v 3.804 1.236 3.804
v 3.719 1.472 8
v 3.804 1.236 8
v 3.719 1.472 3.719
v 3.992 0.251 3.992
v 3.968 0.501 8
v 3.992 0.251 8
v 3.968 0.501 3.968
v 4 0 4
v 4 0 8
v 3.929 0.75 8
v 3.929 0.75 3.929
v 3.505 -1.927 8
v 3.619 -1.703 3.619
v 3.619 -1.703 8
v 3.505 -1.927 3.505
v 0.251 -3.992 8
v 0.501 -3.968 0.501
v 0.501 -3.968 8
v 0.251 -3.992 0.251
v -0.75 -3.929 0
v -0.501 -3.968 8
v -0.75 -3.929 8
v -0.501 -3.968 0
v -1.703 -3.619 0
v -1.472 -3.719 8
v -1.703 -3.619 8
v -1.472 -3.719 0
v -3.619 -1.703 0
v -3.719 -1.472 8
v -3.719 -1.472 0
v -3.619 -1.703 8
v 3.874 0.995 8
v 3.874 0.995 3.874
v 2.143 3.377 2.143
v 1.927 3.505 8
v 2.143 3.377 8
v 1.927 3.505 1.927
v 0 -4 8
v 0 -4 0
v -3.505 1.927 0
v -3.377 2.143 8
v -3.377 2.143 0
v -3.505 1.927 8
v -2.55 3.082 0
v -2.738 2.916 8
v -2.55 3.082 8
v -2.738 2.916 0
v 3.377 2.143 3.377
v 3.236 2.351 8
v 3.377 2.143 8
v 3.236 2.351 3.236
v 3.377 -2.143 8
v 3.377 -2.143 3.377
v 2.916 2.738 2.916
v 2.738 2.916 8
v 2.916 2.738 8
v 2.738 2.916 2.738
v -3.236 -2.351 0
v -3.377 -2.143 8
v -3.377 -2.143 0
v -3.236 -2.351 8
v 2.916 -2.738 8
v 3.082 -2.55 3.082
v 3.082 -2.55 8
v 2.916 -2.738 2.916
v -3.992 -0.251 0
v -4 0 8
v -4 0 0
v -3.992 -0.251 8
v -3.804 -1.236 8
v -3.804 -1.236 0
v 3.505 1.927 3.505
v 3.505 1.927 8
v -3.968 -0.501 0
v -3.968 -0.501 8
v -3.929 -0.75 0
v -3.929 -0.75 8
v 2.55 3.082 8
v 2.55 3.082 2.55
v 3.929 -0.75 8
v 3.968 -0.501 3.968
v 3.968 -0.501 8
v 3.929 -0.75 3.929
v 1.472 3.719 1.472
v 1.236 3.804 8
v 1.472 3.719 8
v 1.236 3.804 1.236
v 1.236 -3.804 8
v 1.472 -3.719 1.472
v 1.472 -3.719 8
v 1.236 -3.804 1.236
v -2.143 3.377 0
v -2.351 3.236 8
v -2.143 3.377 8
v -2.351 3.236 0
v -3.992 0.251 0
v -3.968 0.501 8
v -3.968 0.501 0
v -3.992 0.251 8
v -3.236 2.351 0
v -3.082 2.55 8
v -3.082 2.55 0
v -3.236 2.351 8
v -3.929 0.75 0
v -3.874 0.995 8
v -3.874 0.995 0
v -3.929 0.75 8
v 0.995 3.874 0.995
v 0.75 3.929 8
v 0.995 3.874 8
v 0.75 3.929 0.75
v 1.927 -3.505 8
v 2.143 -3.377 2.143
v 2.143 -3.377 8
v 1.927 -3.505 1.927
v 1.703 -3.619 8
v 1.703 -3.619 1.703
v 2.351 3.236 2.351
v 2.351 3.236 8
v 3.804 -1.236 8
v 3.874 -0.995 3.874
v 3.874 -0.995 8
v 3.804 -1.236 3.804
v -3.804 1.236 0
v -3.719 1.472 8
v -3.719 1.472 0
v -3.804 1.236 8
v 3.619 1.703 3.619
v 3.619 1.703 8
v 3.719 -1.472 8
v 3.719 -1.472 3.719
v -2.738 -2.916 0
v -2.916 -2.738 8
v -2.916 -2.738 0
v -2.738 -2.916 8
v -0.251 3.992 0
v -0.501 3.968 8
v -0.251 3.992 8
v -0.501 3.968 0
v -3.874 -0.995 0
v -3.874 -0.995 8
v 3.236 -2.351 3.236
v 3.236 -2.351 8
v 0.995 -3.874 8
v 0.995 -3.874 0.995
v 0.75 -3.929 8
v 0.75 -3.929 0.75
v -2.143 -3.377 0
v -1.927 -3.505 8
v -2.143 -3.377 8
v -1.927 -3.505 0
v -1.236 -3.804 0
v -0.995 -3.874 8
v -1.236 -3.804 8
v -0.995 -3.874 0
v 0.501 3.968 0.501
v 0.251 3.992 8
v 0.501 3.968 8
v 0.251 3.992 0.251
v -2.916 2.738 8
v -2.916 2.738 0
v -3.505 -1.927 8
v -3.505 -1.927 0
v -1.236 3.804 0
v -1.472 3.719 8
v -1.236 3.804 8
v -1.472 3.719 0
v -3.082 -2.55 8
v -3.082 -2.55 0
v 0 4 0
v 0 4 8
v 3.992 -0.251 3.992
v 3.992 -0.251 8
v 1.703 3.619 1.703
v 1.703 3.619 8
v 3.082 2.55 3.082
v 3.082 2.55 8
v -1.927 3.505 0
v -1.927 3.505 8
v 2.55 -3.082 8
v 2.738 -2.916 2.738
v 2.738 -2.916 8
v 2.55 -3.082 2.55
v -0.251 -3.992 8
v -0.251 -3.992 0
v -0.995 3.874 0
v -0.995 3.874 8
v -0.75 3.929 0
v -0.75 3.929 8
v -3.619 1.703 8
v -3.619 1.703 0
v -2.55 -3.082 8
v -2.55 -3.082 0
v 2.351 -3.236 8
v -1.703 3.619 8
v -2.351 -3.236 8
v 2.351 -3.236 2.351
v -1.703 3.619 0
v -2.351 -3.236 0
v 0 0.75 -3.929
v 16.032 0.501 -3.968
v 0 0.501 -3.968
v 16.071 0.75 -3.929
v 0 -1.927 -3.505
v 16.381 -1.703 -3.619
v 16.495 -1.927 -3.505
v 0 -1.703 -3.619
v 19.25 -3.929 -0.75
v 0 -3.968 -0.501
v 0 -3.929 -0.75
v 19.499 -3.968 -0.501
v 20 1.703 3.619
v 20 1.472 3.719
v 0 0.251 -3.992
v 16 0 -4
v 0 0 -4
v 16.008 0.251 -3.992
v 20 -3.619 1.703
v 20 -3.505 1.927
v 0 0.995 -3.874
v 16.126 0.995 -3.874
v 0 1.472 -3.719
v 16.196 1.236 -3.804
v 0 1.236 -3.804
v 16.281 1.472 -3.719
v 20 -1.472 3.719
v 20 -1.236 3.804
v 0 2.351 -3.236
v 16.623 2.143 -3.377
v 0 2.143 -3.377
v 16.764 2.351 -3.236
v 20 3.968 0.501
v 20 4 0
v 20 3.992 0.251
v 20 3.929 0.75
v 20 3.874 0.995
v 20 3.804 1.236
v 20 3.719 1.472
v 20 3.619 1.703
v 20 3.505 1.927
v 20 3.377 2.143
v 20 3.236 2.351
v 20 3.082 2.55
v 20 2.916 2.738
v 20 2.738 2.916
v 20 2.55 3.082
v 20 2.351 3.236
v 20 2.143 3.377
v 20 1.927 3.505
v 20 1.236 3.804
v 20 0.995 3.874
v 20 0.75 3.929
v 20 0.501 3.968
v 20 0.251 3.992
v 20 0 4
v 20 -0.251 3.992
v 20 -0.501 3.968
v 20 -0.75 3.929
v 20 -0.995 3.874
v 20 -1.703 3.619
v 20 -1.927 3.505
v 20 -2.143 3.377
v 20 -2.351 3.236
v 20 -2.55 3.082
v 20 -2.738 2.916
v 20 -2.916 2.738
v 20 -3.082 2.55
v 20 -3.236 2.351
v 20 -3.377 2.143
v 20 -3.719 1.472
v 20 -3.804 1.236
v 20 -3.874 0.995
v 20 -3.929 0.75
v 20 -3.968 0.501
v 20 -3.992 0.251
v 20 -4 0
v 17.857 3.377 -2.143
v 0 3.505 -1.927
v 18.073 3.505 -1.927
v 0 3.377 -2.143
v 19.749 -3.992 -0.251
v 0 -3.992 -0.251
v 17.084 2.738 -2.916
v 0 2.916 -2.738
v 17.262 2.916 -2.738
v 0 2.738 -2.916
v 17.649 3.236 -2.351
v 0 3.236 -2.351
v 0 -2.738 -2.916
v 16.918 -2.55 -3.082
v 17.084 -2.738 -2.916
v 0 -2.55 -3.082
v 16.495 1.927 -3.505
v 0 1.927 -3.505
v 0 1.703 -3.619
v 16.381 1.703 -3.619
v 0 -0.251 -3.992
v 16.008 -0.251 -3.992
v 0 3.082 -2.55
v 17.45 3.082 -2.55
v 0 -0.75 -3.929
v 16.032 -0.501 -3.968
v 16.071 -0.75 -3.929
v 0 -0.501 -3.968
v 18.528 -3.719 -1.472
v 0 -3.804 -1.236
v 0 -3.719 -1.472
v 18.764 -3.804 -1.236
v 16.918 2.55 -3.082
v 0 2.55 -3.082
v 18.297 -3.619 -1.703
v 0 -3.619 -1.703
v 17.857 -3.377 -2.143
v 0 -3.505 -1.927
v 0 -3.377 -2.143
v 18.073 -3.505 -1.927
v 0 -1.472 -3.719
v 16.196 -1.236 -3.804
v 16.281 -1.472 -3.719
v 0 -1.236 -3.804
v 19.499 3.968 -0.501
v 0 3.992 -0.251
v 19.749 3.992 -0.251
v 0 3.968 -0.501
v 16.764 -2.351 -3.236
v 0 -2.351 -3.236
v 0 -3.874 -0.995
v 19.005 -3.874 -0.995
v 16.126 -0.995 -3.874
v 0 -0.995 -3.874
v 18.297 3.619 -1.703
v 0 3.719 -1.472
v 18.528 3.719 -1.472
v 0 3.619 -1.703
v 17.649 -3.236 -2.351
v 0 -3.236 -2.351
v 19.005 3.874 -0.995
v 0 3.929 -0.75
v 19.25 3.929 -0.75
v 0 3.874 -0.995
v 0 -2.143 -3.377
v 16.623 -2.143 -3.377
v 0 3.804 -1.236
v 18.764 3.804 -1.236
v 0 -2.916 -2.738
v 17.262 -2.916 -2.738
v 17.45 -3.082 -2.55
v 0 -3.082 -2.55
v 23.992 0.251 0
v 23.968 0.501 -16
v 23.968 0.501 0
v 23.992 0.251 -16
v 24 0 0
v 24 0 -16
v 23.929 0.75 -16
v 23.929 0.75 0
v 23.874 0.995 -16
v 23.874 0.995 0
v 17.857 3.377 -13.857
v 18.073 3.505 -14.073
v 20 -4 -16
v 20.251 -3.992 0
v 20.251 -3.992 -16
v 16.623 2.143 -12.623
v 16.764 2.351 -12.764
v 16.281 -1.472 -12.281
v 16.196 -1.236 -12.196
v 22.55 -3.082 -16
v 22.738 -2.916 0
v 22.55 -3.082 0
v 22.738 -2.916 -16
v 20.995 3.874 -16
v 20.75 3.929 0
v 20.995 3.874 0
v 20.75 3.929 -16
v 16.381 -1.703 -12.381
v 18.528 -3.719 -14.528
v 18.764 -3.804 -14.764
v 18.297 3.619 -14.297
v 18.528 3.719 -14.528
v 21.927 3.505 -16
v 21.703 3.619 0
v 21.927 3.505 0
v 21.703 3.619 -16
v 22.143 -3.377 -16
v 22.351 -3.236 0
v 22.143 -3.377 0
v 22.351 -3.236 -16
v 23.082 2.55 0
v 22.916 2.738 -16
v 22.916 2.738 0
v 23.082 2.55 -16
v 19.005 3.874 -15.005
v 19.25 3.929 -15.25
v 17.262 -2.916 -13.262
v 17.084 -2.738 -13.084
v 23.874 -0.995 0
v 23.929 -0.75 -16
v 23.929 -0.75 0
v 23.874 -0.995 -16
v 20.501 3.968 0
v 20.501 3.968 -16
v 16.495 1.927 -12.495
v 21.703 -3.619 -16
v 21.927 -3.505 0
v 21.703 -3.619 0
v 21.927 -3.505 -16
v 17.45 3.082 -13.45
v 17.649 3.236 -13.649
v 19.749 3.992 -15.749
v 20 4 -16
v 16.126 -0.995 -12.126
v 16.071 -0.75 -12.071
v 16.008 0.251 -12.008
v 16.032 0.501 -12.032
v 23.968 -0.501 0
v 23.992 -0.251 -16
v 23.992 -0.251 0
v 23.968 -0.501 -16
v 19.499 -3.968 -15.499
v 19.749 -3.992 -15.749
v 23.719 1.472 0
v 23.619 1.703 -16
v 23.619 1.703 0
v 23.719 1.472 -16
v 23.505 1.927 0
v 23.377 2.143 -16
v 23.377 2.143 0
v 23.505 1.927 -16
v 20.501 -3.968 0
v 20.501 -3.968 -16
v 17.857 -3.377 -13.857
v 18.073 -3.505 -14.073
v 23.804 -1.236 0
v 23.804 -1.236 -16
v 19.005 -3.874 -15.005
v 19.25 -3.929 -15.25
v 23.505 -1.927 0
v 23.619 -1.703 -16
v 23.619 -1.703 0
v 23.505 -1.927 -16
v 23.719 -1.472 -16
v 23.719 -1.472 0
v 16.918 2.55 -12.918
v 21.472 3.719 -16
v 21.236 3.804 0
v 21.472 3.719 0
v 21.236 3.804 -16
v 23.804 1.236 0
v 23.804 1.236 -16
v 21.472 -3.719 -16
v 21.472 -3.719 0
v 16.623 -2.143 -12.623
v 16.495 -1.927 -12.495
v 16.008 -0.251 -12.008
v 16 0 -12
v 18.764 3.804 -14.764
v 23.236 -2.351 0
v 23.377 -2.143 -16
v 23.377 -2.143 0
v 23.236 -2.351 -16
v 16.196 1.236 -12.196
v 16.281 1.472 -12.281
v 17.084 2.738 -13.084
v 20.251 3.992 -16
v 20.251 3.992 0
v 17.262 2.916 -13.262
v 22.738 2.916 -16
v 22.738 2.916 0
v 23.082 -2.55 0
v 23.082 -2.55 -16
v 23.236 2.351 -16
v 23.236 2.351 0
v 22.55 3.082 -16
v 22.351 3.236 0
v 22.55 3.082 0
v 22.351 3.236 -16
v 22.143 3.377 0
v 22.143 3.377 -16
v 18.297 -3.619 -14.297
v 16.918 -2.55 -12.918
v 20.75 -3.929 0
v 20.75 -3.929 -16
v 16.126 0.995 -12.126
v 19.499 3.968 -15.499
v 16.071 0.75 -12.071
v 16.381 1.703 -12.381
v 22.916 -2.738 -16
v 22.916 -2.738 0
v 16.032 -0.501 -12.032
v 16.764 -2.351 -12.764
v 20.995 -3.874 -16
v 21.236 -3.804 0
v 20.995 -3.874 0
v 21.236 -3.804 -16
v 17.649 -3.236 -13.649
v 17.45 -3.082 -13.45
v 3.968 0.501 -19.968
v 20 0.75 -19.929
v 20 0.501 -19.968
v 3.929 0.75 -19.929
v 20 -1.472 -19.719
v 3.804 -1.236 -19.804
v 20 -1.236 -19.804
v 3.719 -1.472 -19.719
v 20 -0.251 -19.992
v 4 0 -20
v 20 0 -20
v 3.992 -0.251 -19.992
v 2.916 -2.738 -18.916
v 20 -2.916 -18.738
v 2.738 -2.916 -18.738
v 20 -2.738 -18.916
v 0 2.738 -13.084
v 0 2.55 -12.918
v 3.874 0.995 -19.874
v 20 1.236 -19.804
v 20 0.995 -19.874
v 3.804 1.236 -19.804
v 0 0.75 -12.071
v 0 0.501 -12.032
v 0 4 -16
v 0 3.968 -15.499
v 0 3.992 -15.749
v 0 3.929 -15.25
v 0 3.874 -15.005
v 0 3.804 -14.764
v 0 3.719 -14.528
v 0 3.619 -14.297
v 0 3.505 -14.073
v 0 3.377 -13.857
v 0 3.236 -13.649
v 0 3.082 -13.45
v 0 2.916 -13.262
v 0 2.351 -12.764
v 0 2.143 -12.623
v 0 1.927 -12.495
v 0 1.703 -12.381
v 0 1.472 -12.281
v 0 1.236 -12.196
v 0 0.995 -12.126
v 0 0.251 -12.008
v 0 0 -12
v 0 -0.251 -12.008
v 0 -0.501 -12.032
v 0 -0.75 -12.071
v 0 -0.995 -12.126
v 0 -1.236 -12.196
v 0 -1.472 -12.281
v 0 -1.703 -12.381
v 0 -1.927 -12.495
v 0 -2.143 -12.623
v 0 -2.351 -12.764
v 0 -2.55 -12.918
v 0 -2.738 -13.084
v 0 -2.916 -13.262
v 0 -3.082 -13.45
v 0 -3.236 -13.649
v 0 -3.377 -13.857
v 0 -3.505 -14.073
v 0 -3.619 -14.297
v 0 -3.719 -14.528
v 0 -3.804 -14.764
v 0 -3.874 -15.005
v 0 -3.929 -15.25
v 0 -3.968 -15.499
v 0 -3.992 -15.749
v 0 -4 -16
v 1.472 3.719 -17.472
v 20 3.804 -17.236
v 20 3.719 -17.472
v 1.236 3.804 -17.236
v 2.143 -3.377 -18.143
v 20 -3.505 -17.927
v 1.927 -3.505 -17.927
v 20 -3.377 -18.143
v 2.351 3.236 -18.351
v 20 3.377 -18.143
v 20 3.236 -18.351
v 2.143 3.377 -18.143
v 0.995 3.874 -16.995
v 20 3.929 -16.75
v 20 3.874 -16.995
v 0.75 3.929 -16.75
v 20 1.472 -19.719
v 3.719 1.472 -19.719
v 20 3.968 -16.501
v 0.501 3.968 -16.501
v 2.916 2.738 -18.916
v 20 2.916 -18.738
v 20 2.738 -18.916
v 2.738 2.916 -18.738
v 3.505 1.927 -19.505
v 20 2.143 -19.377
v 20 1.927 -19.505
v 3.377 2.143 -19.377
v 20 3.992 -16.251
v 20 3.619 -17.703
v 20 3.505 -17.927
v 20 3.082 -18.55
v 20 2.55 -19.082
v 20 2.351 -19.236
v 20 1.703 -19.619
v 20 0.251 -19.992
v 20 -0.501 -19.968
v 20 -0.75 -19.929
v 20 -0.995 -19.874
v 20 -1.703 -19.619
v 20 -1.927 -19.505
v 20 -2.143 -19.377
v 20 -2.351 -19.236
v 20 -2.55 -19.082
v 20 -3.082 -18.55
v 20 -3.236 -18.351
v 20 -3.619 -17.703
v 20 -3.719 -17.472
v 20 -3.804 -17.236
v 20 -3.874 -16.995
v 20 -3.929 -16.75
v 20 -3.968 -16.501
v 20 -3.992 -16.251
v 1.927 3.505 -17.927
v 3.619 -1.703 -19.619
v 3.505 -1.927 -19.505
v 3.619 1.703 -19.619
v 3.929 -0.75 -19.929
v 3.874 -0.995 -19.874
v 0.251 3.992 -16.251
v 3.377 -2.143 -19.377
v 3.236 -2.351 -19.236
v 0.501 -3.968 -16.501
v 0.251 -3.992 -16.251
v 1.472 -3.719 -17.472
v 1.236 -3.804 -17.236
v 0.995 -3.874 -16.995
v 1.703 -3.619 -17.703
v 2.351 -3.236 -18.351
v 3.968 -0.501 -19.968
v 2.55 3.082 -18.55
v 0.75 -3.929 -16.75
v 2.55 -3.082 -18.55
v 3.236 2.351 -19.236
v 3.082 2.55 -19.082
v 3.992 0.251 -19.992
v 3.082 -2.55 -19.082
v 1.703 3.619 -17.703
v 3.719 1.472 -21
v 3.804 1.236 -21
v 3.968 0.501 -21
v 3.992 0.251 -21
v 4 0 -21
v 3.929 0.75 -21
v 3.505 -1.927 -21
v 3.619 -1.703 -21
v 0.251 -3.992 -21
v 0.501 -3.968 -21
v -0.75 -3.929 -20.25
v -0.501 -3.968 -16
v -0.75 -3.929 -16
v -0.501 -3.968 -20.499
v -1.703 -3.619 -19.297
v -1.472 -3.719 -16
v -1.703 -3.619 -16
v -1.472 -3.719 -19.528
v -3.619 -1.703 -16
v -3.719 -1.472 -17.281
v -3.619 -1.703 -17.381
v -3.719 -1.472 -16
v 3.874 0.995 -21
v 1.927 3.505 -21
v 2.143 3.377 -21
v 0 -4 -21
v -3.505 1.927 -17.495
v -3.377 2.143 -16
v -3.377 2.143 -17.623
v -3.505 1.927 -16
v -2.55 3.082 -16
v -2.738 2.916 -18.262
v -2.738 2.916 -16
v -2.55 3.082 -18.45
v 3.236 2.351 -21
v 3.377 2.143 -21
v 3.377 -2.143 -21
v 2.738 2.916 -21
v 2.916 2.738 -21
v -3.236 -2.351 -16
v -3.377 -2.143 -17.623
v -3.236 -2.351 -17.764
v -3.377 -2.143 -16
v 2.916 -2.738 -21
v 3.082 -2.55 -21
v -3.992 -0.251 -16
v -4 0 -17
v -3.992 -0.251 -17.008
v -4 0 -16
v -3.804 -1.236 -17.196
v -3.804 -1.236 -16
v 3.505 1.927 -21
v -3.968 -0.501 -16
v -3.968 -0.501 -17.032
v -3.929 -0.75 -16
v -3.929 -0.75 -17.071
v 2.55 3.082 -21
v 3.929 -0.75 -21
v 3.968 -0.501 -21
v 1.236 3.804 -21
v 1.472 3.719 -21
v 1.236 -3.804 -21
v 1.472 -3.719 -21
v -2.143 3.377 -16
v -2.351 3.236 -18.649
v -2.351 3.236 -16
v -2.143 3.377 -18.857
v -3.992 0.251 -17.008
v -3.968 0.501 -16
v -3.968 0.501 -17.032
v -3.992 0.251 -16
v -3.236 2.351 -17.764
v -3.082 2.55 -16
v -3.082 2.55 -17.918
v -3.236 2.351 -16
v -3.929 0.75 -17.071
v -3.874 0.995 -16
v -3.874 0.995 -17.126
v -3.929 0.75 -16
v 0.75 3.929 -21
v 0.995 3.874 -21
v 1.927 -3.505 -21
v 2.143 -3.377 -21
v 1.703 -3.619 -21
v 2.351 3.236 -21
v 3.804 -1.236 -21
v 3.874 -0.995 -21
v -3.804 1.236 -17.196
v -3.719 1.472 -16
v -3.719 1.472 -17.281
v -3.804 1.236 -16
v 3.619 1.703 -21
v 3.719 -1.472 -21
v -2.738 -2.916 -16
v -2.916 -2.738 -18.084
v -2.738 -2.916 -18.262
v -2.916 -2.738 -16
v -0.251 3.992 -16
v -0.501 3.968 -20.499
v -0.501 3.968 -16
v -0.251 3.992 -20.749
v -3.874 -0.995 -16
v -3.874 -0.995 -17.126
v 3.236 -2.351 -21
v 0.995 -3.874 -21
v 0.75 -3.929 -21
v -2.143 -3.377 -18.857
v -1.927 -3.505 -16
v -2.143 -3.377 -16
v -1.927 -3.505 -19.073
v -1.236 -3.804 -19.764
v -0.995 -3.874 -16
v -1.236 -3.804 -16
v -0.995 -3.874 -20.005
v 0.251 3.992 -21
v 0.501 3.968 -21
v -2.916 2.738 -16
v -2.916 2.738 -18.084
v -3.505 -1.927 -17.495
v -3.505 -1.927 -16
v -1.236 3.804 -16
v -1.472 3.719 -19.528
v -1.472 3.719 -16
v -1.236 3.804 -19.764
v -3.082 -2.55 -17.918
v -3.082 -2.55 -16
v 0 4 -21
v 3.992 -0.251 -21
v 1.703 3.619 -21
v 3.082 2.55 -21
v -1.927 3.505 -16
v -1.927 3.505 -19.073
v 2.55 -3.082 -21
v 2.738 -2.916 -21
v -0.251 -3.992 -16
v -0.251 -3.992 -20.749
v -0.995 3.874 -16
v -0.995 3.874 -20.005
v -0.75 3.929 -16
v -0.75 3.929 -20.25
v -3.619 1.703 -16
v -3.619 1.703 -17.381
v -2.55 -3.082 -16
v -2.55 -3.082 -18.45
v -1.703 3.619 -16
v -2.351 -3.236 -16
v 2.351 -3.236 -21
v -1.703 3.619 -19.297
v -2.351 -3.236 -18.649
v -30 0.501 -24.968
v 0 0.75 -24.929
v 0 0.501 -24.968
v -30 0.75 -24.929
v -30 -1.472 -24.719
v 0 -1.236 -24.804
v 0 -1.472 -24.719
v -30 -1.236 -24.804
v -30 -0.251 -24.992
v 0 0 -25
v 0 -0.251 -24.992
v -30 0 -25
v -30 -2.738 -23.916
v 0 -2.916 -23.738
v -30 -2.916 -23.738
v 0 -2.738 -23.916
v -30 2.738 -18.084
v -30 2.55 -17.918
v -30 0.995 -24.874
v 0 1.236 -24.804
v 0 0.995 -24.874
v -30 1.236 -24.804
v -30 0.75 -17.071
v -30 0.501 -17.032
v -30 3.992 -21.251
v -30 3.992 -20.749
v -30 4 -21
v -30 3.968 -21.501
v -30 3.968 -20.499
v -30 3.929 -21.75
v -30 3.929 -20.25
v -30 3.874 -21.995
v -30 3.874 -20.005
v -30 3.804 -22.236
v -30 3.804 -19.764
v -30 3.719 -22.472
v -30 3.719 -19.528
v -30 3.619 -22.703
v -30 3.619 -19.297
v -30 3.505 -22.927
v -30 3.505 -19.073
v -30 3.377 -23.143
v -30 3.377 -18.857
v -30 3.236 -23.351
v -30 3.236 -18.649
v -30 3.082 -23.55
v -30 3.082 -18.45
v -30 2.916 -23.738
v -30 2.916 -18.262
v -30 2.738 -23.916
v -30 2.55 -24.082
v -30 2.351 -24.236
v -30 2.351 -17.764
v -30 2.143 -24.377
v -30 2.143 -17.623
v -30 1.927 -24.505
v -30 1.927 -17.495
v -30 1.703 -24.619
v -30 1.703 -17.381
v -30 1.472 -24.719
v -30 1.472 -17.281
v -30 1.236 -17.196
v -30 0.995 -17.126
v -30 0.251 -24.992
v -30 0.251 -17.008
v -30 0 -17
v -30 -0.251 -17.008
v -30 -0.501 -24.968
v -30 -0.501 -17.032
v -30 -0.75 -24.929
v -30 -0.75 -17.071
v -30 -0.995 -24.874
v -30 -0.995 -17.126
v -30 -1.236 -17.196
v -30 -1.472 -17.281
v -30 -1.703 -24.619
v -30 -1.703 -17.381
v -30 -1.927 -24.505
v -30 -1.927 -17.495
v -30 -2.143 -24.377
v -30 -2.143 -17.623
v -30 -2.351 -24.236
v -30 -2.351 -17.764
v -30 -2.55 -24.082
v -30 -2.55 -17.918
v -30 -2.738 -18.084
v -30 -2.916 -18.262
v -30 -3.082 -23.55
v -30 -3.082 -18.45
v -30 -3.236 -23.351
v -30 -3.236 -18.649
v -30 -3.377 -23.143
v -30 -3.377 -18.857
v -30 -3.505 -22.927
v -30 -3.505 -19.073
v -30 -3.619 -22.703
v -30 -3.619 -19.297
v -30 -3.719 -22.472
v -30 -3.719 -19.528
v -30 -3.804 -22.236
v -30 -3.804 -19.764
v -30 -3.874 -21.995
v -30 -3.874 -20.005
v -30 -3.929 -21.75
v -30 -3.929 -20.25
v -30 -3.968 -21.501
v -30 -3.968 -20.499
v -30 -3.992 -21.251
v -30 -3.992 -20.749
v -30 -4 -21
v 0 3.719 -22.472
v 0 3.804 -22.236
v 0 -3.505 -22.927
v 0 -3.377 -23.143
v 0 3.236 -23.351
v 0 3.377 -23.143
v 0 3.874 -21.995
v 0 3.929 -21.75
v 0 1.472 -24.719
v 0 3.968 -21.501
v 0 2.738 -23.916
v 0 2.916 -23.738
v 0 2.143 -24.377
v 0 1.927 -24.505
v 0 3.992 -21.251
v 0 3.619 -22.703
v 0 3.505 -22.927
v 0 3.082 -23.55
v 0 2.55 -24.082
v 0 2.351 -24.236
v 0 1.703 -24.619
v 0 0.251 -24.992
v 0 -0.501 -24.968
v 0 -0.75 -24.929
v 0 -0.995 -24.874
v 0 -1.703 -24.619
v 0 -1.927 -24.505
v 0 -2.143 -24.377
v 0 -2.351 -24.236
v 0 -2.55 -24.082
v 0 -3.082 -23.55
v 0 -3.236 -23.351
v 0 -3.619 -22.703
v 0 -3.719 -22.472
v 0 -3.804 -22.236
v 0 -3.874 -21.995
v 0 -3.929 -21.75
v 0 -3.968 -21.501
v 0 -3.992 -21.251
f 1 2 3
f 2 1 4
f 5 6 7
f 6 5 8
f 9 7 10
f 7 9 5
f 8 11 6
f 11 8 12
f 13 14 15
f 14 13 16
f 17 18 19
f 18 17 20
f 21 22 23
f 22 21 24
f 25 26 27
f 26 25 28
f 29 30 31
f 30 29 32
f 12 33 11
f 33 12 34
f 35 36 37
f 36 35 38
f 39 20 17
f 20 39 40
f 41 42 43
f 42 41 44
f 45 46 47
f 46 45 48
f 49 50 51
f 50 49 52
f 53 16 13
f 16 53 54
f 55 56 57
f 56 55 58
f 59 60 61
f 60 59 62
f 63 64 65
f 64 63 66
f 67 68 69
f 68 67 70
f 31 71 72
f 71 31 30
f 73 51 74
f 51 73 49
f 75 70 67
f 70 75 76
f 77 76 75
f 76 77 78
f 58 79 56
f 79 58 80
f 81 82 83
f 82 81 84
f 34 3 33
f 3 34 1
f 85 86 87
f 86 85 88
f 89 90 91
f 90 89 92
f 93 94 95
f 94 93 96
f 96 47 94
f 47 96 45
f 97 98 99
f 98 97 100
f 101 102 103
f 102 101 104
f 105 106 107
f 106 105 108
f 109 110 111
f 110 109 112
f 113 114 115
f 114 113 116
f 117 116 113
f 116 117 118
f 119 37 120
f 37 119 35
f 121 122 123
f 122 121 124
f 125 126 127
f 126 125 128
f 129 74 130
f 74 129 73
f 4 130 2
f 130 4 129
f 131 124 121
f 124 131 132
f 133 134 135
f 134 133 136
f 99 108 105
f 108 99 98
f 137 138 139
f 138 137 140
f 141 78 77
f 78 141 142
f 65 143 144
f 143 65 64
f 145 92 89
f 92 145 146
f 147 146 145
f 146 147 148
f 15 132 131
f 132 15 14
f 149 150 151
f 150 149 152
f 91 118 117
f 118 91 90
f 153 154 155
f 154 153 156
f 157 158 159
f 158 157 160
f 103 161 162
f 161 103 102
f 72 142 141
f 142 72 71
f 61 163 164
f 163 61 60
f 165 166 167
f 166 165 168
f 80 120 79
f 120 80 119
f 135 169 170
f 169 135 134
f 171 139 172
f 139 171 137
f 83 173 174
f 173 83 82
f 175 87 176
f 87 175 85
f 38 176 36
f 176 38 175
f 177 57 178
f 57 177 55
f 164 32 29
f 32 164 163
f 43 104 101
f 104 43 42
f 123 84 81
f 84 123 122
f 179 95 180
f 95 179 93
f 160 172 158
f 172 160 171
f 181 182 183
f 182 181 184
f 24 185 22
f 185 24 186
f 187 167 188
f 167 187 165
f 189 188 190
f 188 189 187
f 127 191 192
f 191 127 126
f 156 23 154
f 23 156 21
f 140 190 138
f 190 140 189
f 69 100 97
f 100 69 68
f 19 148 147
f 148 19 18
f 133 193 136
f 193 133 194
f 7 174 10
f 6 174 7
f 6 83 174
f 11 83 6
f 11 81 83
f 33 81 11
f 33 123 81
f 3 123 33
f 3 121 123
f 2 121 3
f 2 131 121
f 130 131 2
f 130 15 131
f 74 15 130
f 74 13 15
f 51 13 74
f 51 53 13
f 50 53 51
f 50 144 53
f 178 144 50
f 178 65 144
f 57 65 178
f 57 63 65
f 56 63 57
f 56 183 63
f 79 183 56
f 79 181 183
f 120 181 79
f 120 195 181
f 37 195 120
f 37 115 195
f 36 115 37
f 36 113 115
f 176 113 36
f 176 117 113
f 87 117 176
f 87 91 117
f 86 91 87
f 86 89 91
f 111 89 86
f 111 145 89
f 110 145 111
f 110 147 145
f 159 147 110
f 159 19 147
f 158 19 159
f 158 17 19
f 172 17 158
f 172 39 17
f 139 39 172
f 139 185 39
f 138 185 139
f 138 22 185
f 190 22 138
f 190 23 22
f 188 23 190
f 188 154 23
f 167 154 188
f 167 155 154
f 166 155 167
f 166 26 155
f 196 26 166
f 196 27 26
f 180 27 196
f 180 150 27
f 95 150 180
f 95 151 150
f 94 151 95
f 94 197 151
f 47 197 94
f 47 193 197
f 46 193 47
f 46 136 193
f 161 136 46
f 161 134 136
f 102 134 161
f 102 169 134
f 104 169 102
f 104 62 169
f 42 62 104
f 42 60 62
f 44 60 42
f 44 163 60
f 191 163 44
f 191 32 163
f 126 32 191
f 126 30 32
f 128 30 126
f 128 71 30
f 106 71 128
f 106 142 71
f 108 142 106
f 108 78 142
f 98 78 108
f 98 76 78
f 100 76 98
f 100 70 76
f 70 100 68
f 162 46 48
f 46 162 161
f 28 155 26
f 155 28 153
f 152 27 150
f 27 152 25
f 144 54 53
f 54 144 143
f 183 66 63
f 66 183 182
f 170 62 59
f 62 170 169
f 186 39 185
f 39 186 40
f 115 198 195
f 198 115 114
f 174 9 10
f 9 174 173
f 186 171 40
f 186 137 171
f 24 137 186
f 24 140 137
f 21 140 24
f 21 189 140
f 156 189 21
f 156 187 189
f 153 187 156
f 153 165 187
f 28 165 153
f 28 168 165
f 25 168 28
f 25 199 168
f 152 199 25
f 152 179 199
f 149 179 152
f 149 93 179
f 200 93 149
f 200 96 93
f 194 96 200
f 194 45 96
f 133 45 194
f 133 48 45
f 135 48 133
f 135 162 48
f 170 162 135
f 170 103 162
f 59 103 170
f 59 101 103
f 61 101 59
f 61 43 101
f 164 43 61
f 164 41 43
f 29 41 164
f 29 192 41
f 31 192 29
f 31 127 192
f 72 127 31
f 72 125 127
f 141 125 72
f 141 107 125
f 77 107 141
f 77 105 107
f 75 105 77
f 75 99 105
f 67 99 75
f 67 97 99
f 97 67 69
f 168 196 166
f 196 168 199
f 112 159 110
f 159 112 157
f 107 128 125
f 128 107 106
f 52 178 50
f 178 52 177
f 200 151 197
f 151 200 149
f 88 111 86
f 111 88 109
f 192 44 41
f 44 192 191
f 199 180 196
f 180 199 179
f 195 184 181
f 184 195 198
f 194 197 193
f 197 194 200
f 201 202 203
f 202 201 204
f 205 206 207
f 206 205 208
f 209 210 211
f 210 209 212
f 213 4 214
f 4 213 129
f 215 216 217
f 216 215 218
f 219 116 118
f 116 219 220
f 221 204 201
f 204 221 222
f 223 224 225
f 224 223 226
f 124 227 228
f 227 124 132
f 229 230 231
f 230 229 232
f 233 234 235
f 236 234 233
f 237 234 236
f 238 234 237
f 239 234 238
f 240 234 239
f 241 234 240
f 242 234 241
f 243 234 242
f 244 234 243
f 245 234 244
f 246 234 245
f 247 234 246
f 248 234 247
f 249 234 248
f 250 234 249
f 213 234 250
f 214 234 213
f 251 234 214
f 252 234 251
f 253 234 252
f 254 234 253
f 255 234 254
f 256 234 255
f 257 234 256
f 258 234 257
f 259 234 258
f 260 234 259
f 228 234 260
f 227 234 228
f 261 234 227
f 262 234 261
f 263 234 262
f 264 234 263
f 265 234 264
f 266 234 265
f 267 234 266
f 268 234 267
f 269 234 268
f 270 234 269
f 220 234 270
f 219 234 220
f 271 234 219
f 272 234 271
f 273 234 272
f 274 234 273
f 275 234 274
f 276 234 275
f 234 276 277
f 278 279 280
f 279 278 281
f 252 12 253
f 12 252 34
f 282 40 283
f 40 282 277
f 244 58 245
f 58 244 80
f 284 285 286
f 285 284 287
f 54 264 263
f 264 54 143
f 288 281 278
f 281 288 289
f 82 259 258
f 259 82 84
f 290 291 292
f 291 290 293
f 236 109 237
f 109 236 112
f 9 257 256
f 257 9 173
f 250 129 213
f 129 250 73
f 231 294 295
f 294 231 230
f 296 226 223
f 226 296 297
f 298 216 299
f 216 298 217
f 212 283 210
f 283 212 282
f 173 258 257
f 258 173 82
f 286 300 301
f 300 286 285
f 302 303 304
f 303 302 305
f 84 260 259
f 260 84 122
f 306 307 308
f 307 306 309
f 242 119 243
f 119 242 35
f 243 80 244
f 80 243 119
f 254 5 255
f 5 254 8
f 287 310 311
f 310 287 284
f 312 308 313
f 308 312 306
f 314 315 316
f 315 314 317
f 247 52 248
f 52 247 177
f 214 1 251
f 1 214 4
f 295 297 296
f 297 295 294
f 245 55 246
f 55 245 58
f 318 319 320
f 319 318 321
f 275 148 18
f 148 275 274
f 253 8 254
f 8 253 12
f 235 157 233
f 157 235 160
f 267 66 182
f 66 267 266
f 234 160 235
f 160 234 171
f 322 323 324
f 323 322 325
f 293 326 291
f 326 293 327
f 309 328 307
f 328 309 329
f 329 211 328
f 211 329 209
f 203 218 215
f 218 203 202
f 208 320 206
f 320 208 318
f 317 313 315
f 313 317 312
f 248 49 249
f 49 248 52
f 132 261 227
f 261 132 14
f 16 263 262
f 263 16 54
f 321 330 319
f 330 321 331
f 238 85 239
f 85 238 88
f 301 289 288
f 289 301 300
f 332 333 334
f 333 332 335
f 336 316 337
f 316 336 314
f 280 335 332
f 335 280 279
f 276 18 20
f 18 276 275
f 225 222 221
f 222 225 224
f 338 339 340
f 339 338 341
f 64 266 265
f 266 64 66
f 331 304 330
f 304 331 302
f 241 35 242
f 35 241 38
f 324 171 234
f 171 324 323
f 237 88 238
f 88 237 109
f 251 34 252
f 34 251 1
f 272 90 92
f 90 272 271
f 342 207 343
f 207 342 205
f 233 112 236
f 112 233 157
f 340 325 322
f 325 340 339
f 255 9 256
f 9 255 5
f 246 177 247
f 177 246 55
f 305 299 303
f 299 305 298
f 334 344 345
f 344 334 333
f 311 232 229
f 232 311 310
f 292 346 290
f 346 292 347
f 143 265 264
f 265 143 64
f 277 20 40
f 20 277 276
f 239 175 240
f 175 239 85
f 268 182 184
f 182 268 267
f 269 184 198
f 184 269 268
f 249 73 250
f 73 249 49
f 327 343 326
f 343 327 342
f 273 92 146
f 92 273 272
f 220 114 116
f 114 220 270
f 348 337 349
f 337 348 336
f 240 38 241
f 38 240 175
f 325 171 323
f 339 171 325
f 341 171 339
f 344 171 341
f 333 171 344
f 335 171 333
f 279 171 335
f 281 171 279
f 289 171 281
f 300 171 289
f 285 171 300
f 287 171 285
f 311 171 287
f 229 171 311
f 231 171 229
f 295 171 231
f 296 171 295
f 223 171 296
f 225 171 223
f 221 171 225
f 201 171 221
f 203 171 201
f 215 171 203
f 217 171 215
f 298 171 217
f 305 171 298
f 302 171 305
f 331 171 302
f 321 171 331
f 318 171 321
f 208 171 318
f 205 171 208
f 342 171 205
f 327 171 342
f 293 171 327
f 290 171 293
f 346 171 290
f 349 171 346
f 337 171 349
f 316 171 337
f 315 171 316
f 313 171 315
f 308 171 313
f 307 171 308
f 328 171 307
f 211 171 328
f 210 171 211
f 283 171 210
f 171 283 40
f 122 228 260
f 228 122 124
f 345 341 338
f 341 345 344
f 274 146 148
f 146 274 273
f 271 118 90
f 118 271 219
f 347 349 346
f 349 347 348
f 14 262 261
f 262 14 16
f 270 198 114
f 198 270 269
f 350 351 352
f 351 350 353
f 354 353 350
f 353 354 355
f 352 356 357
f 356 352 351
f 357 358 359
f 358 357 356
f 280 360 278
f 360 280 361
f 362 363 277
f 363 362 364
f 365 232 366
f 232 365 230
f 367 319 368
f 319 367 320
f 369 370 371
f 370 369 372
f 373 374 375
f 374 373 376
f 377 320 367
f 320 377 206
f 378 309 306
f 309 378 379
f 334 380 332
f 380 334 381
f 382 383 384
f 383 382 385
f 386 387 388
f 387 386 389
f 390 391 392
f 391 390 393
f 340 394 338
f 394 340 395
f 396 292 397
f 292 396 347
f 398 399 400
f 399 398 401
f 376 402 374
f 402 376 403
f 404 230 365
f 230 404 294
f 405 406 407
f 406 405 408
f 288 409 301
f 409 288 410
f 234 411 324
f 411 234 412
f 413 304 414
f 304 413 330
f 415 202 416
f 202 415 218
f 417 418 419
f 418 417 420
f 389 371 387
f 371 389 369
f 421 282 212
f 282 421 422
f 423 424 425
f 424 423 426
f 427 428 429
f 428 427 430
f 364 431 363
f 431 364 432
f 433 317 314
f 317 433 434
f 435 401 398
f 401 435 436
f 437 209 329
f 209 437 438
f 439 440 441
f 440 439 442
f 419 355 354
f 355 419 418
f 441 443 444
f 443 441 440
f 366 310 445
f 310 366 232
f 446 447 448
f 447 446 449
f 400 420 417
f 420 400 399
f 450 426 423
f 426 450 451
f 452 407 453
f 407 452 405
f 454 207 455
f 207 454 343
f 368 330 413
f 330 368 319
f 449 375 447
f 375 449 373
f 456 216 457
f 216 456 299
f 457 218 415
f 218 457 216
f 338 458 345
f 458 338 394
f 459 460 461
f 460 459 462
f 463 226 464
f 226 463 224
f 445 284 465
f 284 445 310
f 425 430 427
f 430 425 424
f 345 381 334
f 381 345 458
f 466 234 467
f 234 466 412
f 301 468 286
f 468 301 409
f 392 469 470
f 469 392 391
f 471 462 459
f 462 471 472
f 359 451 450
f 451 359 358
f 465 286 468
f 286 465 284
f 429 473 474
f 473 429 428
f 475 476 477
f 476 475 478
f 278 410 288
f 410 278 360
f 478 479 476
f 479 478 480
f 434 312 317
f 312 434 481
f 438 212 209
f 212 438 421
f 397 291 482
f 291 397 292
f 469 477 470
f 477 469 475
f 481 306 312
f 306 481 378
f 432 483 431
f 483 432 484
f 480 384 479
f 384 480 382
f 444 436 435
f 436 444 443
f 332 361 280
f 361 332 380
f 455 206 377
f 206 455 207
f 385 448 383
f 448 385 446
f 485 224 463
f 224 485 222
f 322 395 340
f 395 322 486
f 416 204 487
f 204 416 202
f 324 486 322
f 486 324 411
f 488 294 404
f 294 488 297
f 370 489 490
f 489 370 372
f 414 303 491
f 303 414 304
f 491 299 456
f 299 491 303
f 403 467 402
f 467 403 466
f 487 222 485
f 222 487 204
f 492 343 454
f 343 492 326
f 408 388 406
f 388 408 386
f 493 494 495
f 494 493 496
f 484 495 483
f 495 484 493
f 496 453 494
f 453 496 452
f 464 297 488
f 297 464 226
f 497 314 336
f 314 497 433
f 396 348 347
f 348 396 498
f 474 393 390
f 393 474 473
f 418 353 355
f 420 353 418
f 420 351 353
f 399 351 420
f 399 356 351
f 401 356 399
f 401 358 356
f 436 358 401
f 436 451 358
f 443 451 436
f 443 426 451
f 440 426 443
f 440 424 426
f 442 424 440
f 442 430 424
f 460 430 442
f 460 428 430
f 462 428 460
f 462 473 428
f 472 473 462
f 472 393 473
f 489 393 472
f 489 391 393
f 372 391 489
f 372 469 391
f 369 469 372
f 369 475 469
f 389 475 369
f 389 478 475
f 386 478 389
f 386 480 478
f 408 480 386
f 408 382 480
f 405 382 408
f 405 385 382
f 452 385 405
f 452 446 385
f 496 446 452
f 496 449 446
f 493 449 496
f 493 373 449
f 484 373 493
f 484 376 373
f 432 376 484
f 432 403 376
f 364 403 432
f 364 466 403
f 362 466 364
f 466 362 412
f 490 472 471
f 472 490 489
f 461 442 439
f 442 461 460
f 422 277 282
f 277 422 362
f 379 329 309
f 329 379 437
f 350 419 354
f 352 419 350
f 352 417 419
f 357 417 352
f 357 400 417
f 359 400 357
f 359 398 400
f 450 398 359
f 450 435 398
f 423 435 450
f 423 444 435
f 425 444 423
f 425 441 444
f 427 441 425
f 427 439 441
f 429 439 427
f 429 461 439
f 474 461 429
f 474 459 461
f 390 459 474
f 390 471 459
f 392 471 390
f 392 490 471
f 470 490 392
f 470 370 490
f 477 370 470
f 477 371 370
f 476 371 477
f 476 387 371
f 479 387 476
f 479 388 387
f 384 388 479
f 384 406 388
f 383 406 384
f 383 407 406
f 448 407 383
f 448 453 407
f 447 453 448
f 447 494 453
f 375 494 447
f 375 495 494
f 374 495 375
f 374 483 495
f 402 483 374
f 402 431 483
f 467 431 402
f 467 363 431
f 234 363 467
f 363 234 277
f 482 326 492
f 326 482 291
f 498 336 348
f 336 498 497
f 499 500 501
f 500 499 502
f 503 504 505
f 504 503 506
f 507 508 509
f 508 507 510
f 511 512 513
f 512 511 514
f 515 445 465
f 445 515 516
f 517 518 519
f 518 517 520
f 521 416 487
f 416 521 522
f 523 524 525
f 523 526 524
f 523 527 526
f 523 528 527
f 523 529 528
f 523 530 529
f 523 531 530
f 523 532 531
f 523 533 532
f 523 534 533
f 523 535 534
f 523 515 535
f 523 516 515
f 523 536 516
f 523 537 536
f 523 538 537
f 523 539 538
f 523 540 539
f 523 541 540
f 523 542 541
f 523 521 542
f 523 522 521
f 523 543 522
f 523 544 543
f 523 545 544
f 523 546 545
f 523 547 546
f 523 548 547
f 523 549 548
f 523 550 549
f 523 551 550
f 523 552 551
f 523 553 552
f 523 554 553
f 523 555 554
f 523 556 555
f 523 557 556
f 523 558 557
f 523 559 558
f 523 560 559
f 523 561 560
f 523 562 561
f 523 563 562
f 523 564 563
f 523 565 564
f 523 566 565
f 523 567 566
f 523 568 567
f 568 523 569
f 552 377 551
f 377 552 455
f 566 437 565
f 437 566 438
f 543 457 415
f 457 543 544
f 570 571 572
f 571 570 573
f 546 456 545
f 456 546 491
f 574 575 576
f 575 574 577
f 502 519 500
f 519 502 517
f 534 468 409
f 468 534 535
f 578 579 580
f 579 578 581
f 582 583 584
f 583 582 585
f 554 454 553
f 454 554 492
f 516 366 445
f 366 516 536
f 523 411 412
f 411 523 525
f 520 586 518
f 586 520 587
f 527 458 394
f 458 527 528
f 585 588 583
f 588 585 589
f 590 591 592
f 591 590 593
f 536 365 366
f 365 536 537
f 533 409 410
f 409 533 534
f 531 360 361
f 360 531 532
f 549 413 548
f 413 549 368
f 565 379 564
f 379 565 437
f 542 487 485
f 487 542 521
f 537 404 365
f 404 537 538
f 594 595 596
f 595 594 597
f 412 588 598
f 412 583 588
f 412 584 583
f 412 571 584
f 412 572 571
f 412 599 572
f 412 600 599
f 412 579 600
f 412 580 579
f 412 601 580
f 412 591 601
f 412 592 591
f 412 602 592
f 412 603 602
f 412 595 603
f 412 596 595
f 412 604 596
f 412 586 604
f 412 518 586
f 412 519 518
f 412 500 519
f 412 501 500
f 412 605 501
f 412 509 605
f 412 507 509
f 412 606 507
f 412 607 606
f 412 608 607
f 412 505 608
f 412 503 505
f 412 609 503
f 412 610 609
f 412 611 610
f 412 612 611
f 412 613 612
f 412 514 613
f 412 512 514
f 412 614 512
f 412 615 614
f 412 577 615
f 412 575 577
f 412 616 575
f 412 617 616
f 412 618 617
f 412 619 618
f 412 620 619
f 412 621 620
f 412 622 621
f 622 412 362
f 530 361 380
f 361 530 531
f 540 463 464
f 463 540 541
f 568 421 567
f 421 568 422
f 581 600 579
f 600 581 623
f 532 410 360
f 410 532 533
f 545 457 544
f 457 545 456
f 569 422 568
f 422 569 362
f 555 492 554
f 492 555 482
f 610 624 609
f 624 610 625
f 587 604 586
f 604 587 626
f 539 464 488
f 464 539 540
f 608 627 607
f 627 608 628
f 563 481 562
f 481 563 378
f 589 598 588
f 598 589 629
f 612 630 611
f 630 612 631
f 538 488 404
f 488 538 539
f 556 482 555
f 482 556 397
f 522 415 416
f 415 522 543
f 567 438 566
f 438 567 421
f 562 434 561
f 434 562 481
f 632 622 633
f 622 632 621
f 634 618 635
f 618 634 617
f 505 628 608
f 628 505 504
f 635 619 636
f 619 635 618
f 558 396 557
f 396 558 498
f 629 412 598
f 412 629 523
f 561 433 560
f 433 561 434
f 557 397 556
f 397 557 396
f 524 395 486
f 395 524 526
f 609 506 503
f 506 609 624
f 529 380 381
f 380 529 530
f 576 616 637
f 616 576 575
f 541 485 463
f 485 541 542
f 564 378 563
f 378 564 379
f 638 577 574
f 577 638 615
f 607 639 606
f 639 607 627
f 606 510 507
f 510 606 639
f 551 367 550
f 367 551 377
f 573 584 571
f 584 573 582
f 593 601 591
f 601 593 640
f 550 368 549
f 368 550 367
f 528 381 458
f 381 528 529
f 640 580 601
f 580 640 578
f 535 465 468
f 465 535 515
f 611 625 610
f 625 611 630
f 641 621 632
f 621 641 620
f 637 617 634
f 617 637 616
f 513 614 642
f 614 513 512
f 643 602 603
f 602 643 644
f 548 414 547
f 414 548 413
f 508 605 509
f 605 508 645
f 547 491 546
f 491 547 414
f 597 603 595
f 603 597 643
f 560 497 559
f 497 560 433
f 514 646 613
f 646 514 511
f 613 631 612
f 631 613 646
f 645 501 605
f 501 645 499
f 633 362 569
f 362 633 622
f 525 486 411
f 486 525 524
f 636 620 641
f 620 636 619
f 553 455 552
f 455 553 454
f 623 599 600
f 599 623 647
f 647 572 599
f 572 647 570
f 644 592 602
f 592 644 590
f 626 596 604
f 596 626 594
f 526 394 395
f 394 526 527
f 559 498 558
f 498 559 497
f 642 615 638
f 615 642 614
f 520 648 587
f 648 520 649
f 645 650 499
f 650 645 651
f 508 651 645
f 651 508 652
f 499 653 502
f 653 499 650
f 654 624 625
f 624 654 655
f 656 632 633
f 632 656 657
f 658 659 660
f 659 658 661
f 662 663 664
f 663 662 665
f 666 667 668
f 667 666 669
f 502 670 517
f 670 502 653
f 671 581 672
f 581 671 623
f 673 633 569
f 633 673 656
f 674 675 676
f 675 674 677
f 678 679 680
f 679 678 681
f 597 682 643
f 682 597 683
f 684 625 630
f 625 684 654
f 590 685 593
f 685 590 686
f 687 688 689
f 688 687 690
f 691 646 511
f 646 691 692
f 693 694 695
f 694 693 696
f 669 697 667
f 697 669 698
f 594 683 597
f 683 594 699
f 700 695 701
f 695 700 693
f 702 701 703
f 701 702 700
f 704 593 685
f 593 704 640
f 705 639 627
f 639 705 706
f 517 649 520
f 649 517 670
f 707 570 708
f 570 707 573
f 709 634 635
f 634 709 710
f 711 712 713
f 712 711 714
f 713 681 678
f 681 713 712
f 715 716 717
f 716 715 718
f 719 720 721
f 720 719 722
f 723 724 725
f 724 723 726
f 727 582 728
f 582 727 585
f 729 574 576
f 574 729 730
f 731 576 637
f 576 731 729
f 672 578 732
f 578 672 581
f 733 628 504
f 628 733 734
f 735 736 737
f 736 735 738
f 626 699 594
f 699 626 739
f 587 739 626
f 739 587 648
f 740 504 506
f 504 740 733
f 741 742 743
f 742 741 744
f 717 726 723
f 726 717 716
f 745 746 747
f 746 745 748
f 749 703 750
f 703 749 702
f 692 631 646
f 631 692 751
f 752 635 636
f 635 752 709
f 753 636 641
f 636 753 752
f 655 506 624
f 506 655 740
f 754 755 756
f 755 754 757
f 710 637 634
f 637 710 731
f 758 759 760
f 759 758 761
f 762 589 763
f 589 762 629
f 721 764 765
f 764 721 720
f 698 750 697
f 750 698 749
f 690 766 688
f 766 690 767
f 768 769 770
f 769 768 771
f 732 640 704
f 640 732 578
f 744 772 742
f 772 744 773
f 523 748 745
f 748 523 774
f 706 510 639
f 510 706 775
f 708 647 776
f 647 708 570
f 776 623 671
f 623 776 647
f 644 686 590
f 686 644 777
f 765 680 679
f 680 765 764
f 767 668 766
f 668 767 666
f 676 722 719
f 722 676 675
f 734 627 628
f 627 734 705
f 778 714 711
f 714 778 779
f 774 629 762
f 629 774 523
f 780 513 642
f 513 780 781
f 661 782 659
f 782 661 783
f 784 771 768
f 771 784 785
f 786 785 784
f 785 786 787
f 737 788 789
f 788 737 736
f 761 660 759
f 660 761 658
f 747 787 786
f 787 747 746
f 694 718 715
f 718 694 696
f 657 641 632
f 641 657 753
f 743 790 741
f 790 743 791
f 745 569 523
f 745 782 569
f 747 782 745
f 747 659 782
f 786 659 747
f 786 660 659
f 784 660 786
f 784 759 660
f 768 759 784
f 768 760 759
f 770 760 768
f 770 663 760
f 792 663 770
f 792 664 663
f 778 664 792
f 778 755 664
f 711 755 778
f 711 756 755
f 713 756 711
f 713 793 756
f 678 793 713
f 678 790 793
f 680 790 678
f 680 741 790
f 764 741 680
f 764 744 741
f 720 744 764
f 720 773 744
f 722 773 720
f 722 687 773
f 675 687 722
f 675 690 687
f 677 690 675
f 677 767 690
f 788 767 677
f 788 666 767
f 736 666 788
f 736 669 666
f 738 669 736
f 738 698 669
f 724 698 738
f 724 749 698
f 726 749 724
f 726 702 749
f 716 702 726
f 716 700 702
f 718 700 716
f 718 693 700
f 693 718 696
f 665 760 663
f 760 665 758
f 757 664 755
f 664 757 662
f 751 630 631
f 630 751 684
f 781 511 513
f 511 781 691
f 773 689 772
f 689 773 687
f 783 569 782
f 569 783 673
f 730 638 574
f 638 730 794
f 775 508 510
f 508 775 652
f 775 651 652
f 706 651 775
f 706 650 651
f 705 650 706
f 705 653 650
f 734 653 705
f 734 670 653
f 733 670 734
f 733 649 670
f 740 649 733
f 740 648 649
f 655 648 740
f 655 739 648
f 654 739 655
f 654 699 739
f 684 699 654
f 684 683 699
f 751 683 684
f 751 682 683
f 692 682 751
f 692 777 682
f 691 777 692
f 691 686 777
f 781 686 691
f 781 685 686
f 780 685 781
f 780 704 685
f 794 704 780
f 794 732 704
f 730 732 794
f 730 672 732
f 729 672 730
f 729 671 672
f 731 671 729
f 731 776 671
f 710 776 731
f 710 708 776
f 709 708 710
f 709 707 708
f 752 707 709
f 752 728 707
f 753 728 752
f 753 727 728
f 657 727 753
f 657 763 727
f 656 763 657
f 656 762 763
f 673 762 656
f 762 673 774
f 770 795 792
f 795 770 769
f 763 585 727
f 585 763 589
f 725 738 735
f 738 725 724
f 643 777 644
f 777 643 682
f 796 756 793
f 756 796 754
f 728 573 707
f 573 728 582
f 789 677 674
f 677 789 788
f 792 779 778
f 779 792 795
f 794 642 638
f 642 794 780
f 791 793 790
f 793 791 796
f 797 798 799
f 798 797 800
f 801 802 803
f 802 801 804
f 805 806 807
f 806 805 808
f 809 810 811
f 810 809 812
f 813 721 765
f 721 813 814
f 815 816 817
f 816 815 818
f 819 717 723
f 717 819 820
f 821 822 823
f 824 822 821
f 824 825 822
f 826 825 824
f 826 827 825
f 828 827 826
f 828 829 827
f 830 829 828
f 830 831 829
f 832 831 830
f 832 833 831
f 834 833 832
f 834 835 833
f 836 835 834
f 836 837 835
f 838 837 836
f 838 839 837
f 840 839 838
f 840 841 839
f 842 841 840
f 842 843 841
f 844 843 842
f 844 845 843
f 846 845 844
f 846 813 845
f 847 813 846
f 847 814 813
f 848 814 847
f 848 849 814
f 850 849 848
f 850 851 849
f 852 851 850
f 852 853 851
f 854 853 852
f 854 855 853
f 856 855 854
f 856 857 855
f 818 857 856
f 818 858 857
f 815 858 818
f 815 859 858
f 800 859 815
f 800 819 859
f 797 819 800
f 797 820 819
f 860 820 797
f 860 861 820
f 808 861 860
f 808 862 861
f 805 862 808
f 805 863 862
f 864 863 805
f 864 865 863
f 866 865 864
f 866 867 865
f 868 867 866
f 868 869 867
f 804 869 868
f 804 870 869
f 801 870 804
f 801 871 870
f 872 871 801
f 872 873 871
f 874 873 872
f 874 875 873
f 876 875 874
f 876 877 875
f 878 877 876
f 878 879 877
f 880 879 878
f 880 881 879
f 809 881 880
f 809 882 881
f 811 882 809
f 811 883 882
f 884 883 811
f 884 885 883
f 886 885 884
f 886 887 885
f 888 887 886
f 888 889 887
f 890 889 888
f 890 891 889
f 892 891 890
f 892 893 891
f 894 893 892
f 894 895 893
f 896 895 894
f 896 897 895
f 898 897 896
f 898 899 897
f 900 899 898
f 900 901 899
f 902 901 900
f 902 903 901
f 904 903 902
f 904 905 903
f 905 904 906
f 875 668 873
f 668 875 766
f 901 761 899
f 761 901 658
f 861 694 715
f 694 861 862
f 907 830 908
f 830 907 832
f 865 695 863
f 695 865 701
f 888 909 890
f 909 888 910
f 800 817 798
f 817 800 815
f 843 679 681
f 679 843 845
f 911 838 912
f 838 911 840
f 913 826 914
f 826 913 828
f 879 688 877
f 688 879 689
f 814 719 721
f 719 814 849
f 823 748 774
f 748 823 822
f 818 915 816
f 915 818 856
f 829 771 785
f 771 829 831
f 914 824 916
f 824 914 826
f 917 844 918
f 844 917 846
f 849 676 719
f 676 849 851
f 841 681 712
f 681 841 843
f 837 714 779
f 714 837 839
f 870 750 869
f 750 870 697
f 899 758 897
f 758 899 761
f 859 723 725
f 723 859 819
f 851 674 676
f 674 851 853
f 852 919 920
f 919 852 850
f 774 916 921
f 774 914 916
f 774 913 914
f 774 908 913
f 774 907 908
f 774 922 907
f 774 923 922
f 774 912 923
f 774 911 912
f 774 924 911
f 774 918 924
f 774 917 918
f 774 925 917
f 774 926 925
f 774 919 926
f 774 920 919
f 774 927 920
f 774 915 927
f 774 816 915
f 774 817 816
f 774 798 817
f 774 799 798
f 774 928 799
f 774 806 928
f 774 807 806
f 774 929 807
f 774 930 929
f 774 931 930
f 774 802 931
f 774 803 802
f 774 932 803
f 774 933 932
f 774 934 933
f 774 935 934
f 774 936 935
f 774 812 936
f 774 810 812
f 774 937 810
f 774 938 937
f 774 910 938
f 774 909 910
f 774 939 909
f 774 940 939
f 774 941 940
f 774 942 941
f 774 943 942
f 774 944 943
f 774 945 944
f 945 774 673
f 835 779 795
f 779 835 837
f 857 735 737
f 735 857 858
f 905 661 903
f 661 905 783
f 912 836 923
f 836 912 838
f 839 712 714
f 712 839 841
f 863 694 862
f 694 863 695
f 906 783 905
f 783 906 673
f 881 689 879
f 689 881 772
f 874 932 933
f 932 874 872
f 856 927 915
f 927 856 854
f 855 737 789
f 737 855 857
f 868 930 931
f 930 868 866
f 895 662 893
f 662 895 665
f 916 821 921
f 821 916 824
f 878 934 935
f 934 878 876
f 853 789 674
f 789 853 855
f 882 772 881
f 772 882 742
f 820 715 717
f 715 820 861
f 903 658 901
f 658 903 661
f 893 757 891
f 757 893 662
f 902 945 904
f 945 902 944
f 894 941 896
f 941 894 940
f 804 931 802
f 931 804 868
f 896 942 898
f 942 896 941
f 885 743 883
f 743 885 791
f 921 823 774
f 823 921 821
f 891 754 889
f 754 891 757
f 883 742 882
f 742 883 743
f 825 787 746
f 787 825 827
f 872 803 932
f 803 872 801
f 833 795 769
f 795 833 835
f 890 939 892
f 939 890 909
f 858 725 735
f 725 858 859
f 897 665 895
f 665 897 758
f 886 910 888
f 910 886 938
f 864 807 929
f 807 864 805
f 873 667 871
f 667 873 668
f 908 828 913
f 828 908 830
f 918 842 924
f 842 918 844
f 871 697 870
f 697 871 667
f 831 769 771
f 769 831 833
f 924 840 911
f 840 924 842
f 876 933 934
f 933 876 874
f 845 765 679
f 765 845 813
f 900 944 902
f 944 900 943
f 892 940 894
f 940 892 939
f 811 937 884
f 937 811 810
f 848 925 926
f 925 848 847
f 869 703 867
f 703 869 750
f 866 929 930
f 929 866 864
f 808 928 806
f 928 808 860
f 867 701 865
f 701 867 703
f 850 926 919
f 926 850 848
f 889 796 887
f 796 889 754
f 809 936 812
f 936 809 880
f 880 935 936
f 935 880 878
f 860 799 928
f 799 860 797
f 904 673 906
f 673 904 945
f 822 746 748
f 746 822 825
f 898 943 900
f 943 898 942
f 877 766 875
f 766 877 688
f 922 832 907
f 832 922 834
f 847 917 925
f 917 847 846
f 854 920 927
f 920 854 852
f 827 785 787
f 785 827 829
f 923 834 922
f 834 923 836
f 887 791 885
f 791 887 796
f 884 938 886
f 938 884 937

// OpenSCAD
$fn=100;
h1=8;
h2=20;
h3=16;
h4=20;
h5=5;
h6=30;
d=8;



cylinder(h=h1,d=d,center=false);
rotate([0,90,0]) cylinder(h=h2,d=d,center=false);
translate([h2,0,-h3]) cylinder(h=h3,d=d,center=false);
translate([h2,0,-h3]) rotate([0,-90,0]) cylinder(h=h4,d=d,center=false);
translate([0,0,-h5-h3])cylinder(h=h5,d=d,center=false);
translate([0,0,-h5-h3]) rotate([0,-90,0]) cylinder(h=h6,d=d,center=false);
